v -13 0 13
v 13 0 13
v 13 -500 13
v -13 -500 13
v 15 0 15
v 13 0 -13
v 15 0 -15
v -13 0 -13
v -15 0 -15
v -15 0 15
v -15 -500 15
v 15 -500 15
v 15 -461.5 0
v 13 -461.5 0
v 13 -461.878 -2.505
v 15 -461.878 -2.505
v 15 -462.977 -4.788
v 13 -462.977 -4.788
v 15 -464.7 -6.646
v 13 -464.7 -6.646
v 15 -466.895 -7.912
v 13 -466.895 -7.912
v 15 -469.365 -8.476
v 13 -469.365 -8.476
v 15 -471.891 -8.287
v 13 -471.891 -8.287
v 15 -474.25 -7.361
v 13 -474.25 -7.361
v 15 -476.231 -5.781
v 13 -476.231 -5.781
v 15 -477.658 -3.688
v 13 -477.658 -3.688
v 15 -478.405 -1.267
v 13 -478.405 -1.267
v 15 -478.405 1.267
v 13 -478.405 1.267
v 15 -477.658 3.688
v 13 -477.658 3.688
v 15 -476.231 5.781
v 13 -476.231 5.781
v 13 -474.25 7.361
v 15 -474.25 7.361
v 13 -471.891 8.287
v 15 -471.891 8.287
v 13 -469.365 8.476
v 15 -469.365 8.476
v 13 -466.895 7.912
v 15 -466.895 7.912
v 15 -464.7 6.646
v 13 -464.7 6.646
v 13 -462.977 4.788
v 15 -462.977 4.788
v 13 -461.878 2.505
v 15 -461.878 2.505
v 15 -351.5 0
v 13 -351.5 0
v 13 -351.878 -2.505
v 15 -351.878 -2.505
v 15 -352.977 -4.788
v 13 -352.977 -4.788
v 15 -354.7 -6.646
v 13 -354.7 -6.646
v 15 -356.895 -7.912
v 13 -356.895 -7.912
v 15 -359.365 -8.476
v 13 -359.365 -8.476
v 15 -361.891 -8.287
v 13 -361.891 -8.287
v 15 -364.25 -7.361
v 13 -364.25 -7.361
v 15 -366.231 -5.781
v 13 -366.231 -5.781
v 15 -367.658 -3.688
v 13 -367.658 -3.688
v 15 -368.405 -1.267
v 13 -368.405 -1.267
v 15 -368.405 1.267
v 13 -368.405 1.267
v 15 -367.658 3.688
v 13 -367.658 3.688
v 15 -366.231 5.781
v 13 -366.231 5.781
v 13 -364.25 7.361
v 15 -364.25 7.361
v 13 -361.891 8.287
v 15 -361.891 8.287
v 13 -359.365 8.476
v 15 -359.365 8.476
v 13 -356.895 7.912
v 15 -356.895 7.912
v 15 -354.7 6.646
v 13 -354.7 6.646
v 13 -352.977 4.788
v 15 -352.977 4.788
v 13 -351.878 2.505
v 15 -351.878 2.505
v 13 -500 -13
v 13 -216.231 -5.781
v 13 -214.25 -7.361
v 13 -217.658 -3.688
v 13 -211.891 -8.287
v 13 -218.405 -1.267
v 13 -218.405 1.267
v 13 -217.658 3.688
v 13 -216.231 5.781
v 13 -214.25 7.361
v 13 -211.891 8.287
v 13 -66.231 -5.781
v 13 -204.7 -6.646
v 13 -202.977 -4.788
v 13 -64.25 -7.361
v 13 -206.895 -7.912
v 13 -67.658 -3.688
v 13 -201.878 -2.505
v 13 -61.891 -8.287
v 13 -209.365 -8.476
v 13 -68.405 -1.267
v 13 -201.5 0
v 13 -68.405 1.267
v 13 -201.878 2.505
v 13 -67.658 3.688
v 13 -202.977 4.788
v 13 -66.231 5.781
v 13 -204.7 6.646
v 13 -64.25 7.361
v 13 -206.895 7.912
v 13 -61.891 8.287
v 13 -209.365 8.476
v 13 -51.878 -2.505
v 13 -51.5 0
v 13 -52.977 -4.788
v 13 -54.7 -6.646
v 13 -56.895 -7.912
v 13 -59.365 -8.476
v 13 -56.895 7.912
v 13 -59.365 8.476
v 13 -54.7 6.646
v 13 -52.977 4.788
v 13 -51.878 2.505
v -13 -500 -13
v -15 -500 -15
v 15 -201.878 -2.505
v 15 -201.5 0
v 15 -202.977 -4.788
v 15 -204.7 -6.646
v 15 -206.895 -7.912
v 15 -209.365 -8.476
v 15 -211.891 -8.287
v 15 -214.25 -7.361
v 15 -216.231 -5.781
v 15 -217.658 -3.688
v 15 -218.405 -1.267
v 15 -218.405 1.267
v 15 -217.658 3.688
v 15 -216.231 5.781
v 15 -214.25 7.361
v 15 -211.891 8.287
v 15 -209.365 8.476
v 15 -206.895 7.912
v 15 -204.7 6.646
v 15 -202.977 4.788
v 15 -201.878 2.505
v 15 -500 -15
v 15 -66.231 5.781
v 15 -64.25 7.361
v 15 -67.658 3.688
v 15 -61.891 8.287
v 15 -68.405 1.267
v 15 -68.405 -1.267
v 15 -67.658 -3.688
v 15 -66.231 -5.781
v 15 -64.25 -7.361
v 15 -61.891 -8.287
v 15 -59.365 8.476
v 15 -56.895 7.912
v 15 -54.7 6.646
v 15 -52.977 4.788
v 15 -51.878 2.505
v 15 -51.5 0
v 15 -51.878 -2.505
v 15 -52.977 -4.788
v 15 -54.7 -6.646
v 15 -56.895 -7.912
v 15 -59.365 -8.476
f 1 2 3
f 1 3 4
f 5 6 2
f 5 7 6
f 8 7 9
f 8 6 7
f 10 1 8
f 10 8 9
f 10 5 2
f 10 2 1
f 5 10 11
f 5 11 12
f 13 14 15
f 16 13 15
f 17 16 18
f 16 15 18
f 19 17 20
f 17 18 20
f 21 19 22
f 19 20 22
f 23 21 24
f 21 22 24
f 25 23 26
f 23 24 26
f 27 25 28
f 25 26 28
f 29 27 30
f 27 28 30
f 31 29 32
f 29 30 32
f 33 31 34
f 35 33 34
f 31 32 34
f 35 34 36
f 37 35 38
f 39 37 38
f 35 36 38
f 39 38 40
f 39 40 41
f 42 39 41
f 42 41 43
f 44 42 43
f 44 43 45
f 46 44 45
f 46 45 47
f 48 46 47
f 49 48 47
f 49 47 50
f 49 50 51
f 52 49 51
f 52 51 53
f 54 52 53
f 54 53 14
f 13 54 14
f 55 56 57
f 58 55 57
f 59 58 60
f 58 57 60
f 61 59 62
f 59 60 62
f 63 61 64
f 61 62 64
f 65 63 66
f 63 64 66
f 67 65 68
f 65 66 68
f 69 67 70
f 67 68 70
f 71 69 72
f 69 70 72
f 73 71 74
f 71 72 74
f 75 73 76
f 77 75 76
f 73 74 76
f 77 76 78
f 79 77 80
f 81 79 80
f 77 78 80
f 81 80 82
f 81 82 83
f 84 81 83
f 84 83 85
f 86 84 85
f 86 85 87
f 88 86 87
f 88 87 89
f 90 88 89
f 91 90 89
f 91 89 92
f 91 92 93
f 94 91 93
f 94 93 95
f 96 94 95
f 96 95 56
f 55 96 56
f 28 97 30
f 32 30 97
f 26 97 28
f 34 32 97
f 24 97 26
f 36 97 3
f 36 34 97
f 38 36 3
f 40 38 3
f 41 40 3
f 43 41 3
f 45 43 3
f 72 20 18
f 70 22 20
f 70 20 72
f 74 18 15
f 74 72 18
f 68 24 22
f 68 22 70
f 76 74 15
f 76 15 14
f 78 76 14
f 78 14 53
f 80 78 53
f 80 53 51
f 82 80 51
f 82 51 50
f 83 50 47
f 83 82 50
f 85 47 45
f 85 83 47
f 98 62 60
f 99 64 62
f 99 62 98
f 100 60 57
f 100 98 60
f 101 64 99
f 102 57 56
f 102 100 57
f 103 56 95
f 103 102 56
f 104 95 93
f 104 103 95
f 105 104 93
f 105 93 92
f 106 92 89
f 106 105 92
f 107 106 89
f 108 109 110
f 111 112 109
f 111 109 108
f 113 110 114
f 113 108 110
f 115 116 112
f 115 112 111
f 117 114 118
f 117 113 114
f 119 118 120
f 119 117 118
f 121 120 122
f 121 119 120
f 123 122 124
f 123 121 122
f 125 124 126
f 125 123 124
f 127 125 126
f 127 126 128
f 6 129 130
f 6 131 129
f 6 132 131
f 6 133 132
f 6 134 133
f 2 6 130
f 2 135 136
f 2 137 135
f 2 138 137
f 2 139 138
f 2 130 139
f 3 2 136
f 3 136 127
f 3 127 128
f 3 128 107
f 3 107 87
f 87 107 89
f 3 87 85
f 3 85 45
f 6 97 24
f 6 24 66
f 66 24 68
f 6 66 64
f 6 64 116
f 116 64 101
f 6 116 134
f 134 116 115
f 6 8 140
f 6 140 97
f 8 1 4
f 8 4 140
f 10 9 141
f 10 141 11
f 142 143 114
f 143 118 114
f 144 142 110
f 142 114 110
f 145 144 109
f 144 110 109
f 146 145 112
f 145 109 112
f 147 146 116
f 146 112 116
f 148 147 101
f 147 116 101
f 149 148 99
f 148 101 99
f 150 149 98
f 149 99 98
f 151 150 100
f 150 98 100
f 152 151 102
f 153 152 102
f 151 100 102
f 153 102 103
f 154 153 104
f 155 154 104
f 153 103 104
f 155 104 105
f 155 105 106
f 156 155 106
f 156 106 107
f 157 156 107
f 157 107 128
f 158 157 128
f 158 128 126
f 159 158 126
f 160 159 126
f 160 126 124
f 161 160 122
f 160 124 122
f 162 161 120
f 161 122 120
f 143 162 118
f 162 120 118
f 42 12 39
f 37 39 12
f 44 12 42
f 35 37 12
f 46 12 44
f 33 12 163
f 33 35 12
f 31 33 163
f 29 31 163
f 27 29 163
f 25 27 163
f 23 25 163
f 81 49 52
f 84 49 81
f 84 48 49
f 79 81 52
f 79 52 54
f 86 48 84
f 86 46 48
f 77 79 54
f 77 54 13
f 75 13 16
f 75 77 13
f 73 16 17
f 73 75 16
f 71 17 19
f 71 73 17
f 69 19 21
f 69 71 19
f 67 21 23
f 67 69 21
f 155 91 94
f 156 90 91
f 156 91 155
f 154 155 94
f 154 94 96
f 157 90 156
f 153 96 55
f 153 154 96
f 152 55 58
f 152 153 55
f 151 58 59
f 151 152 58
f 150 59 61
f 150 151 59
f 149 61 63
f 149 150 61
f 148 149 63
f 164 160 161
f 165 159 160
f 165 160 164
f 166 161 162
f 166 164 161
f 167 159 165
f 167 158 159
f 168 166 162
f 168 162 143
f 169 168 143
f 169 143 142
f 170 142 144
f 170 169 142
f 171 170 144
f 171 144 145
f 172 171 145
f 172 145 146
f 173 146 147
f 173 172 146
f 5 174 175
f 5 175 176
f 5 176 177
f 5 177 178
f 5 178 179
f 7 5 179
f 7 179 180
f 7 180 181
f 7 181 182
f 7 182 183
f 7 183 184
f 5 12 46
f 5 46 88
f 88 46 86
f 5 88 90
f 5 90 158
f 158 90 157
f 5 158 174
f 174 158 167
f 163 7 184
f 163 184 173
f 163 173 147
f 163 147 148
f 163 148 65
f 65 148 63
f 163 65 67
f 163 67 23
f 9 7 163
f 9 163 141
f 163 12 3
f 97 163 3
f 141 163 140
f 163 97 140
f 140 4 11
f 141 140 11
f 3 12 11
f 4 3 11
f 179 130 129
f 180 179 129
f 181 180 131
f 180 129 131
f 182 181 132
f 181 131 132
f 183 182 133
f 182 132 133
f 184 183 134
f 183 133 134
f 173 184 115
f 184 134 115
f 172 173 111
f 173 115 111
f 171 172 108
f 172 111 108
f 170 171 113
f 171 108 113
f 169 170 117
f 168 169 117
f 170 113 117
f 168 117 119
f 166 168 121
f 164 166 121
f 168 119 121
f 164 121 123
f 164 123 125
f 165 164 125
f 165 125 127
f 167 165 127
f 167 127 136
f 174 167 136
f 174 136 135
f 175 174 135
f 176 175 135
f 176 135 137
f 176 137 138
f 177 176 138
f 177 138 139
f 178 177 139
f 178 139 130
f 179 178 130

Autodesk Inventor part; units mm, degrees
ref_plane "YZ Plane" through (0, 0, 0) normal (1, 0, 0) x (0, 1, 0)
ref_plane "XZ Plane" through (0, 0, 0) normal (0, 1, 0) x (-1, 0, 0)
ref_plane "XY Plane" through (0, 0, 0) normal (0, 0, 1) x (1, 0, 0)
sketch "Sketch9" plane through (0, 0, 0) normal (0, 1, 0) x (-1, 0, 0)
  line L0 (15, 15) -> (-15, 15)
  line L1 (-15, 15) -> (-15, -15)
  line L2 (-15, -15) -> (15, -15)
  line L3 (15, -15) -> (15, 15)
  line L4 (15, 15) -> (-15, -15) construction
  line L5 (-15, 15) -> (15, -15) construction
  line L6 (-13, 13) -> (13, 13)
  line L7 (13, 13) -> (13, -13)
  line L8 (13, -13) -> (-13, -13)
  line L9 (-13, -13) -> (-13, 13)
  point P0 (0, 0)
  dimension "d172" = 30
  dimension "d173" = 30
  dimension "d174" = 2
extrude "Extrusion3" add sketch "Sketch9" against normal blind 500
sketch "Sketch10" plane through (0, 0, 0) normal (1, 0, 0) x (0, 1, 0)
  line L0 (0, 15) -> (0, -15) construction
  line L1 (0, 15) -> (-500, 15) construction
  line L2 (-500, -15) -> (-500, 15) construction
  line L3 (0, -15) -> (-500, -15) construction
  line L4 (-68.5, 8.5) -> (-51.5, 8.5)
  line L5 (-51.5, 8.5) -> (-51.5, -8.5)
  line L6 (-51.5, -8.5) -> (-68.5, -8.5)
  line L7 (-68.5, -8.5) -> (-68.5, 8.5)
  line L8 (-68.5, 8.5) -> (-51.5, -8.5) construction
  line L9 (-51.5, 8.5) -> (-68.5, -8.5) construction
  line L10 (-218.5, 8.5) -> (-201.5, 8.5)
  line L11 (-201.5, 8.5) -> (-201.5, -8.5)
  line L12 (-201.5, -8.5) -> (-218.5, -8.5)
  line L13 (-218.5, -8.5) -> (-218.5, 8.5)
  line L14 (-218.5, 8.5) -> (-201.5, -8.5) construction
  line L15 (-201.5, 8.5) -> (-218.5, -8.5) construction
  line L16 (-368.5, 8.5) -> (-351.5, 8.5)
  line L17 (-351.5, 8.5) -> (-351.5, -8.5)
  line L18 (-351.5, -8.5) -> (-368.5, -8.5)
  line L19 (-368.5, -8.5) -> (-368.5, 8.5)
  line L20 (-368.5, 8.5) -> (-351.5, -8.5) construction
  line L21 (-351.5, 8.5) -> (-368.5, -8.5) construction
  circle A0 centre (-470, 0) radius 8.5
  line L22 (0, 0) -> (30, 0)
  circle A1 centre (-60, 0) radius 8.5
  circle A2 centre (-210, 0) radius 8.5
  circle A3 centre (-360, 0) radius 8.5
  dimension "d177" = 17
  dimension "d178" = 17
  dimension "d181" = 30
  dimension "d182" = 90
  dimension "d183" = 240
  dimension "d184" = 390
  dimension "d185" = 500
  dimension "d186" = 17
extrude "Extrusion4" cut sketch "Sketch10" along normal through all contours A1 | A2 | A3 | A0
properties part number "PNS 754 FDS 1200 way tube 1" material "Stainless Steel"
